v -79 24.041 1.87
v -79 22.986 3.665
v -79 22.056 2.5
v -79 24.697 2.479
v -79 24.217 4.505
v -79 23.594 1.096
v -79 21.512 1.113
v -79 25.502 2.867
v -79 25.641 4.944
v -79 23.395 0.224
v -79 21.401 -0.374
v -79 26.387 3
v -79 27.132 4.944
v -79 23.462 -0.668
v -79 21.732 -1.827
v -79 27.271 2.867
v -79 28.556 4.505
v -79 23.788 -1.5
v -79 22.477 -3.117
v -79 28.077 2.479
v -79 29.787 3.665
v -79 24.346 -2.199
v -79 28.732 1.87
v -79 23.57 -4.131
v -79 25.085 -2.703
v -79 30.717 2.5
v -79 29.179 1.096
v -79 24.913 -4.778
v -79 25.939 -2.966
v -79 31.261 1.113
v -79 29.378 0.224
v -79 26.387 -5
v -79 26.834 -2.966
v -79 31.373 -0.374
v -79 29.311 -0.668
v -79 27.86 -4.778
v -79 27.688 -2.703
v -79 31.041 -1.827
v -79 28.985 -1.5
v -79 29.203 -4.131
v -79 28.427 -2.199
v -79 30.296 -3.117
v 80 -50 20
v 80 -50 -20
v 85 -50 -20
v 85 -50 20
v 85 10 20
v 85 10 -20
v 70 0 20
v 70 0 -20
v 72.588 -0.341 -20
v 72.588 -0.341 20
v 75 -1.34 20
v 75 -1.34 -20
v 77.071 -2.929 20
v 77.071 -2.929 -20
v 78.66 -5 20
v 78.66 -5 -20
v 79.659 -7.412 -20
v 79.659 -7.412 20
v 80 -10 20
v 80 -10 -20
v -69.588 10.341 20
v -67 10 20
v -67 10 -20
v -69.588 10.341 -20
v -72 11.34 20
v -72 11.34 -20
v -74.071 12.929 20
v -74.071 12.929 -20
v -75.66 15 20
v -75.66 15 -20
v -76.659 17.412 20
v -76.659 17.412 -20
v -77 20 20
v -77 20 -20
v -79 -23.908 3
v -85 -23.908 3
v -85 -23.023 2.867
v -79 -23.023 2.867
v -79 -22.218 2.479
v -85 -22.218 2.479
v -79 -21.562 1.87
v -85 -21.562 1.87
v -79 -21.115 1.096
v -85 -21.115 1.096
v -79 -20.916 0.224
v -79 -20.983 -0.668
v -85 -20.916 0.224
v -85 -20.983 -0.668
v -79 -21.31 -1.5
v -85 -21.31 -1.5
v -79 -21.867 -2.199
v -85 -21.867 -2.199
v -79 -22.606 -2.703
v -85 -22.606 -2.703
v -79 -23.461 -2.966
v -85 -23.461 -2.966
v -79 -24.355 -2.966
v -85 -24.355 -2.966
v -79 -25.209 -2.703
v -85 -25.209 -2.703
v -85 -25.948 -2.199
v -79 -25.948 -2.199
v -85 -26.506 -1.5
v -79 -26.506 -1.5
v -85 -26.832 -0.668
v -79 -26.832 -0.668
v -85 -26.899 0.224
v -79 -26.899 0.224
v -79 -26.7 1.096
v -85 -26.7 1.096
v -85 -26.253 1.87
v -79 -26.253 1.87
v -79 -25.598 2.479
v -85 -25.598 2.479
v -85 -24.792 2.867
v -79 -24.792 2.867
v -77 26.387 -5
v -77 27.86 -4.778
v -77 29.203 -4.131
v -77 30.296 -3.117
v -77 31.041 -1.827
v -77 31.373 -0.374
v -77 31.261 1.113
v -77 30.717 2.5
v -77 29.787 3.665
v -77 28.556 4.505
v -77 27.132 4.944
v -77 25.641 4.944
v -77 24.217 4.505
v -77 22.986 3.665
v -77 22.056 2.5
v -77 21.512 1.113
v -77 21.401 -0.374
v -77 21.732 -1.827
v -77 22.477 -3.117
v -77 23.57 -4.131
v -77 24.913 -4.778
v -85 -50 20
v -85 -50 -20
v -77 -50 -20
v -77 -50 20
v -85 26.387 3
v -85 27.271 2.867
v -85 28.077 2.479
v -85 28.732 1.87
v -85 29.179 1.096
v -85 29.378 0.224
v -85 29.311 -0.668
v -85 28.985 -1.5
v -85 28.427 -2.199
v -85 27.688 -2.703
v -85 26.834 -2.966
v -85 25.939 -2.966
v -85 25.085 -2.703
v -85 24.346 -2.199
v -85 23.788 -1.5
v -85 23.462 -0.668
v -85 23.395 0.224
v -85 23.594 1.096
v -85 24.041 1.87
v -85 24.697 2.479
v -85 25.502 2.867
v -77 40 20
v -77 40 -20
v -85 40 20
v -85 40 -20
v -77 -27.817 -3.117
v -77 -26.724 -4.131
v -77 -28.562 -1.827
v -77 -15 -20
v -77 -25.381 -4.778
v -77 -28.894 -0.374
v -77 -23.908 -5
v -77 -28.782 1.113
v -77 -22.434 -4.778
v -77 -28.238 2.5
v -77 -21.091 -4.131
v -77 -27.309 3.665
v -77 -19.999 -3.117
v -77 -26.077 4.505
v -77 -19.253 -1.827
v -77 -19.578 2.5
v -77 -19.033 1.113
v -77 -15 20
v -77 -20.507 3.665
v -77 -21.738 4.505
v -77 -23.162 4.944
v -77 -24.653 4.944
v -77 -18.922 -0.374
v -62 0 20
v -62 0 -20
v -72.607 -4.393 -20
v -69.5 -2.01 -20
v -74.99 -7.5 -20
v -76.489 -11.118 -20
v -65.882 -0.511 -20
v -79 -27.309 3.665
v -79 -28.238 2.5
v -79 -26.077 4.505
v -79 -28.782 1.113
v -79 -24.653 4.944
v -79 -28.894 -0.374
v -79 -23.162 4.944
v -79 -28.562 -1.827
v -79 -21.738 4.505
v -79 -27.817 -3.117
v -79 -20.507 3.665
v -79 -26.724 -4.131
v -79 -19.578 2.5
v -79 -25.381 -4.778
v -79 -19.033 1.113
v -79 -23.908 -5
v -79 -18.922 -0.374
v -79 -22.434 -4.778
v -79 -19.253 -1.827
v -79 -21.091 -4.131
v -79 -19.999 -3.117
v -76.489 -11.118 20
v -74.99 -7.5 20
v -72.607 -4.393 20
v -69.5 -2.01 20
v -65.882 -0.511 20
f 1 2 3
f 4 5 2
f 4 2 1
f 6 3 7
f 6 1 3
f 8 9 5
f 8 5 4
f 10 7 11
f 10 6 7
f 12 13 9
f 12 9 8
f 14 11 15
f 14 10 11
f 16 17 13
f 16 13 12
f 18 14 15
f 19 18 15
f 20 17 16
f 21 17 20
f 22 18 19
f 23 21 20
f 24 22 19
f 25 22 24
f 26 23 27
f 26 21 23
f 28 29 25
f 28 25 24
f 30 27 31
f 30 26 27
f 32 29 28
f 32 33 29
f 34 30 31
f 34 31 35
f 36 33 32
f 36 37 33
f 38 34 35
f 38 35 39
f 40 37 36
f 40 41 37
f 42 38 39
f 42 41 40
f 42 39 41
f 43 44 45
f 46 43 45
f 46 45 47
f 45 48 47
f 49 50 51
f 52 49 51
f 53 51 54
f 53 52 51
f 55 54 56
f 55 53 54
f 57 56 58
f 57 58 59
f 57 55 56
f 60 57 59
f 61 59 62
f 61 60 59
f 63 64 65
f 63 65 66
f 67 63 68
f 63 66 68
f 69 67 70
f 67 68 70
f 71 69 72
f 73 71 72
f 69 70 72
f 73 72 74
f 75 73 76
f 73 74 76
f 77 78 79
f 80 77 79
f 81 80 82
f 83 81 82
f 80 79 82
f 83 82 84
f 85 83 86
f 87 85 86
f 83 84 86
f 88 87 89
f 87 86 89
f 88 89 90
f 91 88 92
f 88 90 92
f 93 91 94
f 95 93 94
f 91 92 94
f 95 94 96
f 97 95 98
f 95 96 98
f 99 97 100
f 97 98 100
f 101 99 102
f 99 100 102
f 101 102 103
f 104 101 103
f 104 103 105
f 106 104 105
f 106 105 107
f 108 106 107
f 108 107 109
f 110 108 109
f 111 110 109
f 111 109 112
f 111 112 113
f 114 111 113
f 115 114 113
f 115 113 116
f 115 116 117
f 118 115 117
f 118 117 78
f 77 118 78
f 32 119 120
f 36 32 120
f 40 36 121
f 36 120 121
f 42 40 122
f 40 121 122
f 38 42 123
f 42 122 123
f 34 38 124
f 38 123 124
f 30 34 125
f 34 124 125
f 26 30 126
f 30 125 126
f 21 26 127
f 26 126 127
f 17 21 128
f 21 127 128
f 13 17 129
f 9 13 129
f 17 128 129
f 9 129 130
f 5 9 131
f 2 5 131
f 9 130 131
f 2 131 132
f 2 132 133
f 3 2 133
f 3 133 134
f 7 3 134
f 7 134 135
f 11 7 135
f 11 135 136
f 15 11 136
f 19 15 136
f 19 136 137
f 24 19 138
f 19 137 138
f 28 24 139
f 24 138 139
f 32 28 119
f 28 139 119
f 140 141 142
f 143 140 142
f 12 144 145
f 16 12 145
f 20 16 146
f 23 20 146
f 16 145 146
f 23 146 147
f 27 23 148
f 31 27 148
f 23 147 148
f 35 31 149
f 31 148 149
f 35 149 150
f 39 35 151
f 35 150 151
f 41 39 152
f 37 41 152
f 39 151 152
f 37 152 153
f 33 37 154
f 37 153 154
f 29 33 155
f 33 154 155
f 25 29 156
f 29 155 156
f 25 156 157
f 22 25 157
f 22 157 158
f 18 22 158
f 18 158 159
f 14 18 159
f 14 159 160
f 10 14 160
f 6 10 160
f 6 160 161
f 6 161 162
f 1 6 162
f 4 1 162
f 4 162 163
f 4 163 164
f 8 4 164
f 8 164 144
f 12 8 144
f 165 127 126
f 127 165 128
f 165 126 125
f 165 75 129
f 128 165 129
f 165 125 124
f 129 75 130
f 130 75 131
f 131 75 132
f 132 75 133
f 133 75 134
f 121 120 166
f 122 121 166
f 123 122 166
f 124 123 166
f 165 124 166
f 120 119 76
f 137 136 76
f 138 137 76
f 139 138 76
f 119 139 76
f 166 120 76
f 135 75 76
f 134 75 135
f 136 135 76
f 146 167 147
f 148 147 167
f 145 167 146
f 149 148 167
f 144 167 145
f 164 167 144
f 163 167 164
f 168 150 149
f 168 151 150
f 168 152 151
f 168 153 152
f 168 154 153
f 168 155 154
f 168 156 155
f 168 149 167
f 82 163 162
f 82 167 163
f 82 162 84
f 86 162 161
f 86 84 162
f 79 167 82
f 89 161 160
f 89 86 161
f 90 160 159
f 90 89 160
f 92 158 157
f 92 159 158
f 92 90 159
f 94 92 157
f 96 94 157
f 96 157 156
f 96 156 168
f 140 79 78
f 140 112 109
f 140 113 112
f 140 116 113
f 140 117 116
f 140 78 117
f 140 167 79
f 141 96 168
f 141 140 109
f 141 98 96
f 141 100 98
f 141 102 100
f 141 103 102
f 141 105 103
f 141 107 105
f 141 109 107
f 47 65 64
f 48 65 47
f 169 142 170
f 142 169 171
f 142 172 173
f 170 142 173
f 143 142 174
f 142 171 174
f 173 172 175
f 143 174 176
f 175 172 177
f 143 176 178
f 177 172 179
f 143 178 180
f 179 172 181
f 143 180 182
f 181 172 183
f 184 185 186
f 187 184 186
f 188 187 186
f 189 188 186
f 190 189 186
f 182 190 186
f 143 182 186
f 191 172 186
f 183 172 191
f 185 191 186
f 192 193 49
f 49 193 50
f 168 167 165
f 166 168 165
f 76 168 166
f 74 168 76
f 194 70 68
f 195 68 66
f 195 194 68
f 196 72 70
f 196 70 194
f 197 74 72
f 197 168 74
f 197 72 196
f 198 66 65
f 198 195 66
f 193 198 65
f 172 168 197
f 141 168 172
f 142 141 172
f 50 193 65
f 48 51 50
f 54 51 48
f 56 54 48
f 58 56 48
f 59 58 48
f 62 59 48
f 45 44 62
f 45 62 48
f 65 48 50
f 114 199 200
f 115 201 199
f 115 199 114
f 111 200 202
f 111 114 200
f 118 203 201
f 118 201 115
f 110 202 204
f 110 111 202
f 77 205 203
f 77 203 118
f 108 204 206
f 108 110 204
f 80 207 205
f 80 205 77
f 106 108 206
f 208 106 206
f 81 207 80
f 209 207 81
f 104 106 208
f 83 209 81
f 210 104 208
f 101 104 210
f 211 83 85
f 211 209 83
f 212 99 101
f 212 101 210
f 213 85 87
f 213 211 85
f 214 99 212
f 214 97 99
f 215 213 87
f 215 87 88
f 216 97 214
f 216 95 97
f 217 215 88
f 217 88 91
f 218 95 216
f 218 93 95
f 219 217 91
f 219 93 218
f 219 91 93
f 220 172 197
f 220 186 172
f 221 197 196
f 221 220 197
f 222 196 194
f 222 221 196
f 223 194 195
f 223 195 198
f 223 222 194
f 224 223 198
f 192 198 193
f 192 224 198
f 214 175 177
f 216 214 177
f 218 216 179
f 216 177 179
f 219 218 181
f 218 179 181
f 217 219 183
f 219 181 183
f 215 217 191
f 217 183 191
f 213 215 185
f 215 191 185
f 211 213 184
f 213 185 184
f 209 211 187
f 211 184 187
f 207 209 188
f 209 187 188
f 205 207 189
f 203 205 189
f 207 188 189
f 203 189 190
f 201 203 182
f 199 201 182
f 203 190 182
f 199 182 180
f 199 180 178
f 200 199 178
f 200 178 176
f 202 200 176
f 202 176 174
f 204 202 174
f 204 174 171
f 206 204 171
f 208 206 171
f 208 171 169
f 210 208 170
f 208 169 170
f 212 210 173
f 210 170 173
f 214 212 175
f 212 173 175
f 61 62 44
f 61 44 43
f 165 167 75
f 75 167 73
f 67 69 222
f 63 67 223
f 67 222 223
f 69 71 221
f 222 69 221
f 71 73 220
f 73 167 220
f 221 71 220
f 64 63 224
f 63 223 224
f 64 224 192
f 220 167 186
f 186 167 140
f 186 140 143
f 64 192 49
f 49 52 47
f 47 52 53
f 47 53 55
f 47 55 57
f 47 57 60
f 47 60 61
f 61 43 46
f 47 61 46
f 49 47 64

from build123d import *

# Parameters (mm, degrees)
ESQUISSE2_W             = 170
ESQUISSE2_H             = 40
BOSS_EXTRU_1_DEPTH      = 10
ESQUISSE3_W             = 8
ESQUISSE3_H             = 40
BOSS_EXTRU_2_DEPTH      = 50
ESQUISSE4_W             = 5
ESQUISSE4_H             = 40
BOSS_EXTRU_3_DEPTH      = 50
CONG_1_R                = 15
CONG_2_R                = 10
ESQUISSE7_W             = 8
ESQUISSE7_H             = 40
BOSS_EXTRU_4_DEPTH      = 30
CONG_3_R                = 10
ENL_V_MAT_EXTRU_3_REACH = 180.326
ESQUISSE8_R             = 3
ESQUISSE10_R            = 5
ENL_V_MAT_EXTRU_4_DEPTH = 2
ESQUISSE11_R            = 5
ENL_V_MAT_EXTRU_5_DEPTH = 2


with BuildPart() as part:
    # Esquisse2 → Boss.-Extru.1 (new body)
    with BuildSketch(Plane(origin=(0, 0, 0), x_dir=(1, 0, 0), z_dir=(0, 1, 0))):
        Rectangle(ESQUISSE2_W, ESQUISSE2_H)
    extrude(amount=BOSS_EXTRU_1_DEPTH)

    # Esquisse3 → Boss.-Extru.2 (add)
    with BuildSketch(Plane.XZ):
        with Locations((-81, 0)):
            Rectangle(ESQUISSE3_W, ESQUISSE3_H)
    extrude(amount=BOSS_EXTRU_2_DEPTH)

    # Esquisse4 → Boss.-Extru.3 (add)
    with BuildSketch(Plane.XZ):
        with Locations((82.5, 0)):
            Rectangle(ESQUISSE4_W, ESQUISSE4_H)
    extrude(amount=BOSS_EXTRU_3_DEPTH)

    # Congé1
    cong_1_edges = [part.edges().sort_by_distance(p)[0] for p in [
        (-77, 0, 0),
    ]]
    fillet(cong_1_edges, radius=CONG_1_R)

    # Congé2
    cong_2_edges = [part.edges().sort_by_distance(p)[0] for p in [
        (80, 0, 0),
    ]]
    fillet(cong_2_edges, radius=CONG_2_R)

    # Esquisse7 → Boss.-Extru.4 (add)
    with BuildSketch(Plane(origin=(0, 10, 0), x_dir=(1, 0, 0), z_dir=(0, 1, 0))):
        with Locations((-81, 0)):
            Rectangle(ESQUISSE7_W, ESQUISSE7_H)
    extrude(amount=BOSS_EXTRU_4_DEPTH)

    # Congé3
    cong_3_edges = [part.edges().sort_by_distance(p)[0] for p in [
        (-77, 10, 0),
    ]]
    fillet(cong_3_edges, radius=CONG_3_R)

    # Esquisse8 → Enlèv. mat.-Extru.3 (cut, up to next)
    with BuildSketch(Plane.ZY.offset(85), mode=Mode.PRIVATE) as enl_v_mat_extru_3_sk1:
        with Locations((0, 26.38656459)):
            Circle(ESQUISSE8_R)
    enl_v_mat_extru_3_tool1 = extrude(enl_v_mat_extru_3_sk1.sketch, amount=-ENL_V_MAT_EXTRU_3_REACH, mode=Mode.PRIVATE) & part.part
    # Esquisse8 → Enlèv. mat.-Extru.3 (cut, up to next)
    with BuildSketch(Plane.ZY.offset(85), mode=Mode.PRIVATE) as enl_v_mat_extru_3_sk2:
        with Locations((0, -23.907675409)):
            Circle(ESQUISSE8_R)
    enl_v_mat_extru_3_tool2 = extrude(enl_v_mat_extru_3_sk2.sketch, amount=-ENL_V_MAT_EXTRU_3_REACH, mode=Mode.PRIVATE) & part.part
    add(enl_v_mat_extru_3_tool1.solids().sort_by_distance((-85, 26.386565, 0))[0], mode=Mode.SUBTRACT)
    add(enl_v_mat_extru_3_tool2.solids().sort_by_distance((-85, -23.907675, 0))[0], mode=Mode.SUBTRACT)

    # Esquisse10 → Enlèv. mat.-Extru.4 (cut)
    with BuildSketch(Plane(origin=(-77, 0, 0), x_dir=(0, 0, -1), z_dir=(1, 0, 0))):
        with Locations((0, -23.907675409)):
            Circle(ESQUISSE10_R)
    extrude(amount=-ENL_V_MAT_EXTRU_4_DEPTH, mode=Mode.SUBTRACT)

    # Esquisse11 → Enlèv. mat.-Extru.5 (cut)
    with BuildSketch(Plane(origin=(-77, 0, 0), x_dir=(0, 0, -1), z_dir=(1, 0, 0))):
        with Locations((0, 26.38656459)):
            Circle(ESQUISSE11_R)
    extrude(amount=-ENL_V_MAT_EXTRU_5_DEPTH, mode=Mode.SUBTRACT)


solid = part.part
